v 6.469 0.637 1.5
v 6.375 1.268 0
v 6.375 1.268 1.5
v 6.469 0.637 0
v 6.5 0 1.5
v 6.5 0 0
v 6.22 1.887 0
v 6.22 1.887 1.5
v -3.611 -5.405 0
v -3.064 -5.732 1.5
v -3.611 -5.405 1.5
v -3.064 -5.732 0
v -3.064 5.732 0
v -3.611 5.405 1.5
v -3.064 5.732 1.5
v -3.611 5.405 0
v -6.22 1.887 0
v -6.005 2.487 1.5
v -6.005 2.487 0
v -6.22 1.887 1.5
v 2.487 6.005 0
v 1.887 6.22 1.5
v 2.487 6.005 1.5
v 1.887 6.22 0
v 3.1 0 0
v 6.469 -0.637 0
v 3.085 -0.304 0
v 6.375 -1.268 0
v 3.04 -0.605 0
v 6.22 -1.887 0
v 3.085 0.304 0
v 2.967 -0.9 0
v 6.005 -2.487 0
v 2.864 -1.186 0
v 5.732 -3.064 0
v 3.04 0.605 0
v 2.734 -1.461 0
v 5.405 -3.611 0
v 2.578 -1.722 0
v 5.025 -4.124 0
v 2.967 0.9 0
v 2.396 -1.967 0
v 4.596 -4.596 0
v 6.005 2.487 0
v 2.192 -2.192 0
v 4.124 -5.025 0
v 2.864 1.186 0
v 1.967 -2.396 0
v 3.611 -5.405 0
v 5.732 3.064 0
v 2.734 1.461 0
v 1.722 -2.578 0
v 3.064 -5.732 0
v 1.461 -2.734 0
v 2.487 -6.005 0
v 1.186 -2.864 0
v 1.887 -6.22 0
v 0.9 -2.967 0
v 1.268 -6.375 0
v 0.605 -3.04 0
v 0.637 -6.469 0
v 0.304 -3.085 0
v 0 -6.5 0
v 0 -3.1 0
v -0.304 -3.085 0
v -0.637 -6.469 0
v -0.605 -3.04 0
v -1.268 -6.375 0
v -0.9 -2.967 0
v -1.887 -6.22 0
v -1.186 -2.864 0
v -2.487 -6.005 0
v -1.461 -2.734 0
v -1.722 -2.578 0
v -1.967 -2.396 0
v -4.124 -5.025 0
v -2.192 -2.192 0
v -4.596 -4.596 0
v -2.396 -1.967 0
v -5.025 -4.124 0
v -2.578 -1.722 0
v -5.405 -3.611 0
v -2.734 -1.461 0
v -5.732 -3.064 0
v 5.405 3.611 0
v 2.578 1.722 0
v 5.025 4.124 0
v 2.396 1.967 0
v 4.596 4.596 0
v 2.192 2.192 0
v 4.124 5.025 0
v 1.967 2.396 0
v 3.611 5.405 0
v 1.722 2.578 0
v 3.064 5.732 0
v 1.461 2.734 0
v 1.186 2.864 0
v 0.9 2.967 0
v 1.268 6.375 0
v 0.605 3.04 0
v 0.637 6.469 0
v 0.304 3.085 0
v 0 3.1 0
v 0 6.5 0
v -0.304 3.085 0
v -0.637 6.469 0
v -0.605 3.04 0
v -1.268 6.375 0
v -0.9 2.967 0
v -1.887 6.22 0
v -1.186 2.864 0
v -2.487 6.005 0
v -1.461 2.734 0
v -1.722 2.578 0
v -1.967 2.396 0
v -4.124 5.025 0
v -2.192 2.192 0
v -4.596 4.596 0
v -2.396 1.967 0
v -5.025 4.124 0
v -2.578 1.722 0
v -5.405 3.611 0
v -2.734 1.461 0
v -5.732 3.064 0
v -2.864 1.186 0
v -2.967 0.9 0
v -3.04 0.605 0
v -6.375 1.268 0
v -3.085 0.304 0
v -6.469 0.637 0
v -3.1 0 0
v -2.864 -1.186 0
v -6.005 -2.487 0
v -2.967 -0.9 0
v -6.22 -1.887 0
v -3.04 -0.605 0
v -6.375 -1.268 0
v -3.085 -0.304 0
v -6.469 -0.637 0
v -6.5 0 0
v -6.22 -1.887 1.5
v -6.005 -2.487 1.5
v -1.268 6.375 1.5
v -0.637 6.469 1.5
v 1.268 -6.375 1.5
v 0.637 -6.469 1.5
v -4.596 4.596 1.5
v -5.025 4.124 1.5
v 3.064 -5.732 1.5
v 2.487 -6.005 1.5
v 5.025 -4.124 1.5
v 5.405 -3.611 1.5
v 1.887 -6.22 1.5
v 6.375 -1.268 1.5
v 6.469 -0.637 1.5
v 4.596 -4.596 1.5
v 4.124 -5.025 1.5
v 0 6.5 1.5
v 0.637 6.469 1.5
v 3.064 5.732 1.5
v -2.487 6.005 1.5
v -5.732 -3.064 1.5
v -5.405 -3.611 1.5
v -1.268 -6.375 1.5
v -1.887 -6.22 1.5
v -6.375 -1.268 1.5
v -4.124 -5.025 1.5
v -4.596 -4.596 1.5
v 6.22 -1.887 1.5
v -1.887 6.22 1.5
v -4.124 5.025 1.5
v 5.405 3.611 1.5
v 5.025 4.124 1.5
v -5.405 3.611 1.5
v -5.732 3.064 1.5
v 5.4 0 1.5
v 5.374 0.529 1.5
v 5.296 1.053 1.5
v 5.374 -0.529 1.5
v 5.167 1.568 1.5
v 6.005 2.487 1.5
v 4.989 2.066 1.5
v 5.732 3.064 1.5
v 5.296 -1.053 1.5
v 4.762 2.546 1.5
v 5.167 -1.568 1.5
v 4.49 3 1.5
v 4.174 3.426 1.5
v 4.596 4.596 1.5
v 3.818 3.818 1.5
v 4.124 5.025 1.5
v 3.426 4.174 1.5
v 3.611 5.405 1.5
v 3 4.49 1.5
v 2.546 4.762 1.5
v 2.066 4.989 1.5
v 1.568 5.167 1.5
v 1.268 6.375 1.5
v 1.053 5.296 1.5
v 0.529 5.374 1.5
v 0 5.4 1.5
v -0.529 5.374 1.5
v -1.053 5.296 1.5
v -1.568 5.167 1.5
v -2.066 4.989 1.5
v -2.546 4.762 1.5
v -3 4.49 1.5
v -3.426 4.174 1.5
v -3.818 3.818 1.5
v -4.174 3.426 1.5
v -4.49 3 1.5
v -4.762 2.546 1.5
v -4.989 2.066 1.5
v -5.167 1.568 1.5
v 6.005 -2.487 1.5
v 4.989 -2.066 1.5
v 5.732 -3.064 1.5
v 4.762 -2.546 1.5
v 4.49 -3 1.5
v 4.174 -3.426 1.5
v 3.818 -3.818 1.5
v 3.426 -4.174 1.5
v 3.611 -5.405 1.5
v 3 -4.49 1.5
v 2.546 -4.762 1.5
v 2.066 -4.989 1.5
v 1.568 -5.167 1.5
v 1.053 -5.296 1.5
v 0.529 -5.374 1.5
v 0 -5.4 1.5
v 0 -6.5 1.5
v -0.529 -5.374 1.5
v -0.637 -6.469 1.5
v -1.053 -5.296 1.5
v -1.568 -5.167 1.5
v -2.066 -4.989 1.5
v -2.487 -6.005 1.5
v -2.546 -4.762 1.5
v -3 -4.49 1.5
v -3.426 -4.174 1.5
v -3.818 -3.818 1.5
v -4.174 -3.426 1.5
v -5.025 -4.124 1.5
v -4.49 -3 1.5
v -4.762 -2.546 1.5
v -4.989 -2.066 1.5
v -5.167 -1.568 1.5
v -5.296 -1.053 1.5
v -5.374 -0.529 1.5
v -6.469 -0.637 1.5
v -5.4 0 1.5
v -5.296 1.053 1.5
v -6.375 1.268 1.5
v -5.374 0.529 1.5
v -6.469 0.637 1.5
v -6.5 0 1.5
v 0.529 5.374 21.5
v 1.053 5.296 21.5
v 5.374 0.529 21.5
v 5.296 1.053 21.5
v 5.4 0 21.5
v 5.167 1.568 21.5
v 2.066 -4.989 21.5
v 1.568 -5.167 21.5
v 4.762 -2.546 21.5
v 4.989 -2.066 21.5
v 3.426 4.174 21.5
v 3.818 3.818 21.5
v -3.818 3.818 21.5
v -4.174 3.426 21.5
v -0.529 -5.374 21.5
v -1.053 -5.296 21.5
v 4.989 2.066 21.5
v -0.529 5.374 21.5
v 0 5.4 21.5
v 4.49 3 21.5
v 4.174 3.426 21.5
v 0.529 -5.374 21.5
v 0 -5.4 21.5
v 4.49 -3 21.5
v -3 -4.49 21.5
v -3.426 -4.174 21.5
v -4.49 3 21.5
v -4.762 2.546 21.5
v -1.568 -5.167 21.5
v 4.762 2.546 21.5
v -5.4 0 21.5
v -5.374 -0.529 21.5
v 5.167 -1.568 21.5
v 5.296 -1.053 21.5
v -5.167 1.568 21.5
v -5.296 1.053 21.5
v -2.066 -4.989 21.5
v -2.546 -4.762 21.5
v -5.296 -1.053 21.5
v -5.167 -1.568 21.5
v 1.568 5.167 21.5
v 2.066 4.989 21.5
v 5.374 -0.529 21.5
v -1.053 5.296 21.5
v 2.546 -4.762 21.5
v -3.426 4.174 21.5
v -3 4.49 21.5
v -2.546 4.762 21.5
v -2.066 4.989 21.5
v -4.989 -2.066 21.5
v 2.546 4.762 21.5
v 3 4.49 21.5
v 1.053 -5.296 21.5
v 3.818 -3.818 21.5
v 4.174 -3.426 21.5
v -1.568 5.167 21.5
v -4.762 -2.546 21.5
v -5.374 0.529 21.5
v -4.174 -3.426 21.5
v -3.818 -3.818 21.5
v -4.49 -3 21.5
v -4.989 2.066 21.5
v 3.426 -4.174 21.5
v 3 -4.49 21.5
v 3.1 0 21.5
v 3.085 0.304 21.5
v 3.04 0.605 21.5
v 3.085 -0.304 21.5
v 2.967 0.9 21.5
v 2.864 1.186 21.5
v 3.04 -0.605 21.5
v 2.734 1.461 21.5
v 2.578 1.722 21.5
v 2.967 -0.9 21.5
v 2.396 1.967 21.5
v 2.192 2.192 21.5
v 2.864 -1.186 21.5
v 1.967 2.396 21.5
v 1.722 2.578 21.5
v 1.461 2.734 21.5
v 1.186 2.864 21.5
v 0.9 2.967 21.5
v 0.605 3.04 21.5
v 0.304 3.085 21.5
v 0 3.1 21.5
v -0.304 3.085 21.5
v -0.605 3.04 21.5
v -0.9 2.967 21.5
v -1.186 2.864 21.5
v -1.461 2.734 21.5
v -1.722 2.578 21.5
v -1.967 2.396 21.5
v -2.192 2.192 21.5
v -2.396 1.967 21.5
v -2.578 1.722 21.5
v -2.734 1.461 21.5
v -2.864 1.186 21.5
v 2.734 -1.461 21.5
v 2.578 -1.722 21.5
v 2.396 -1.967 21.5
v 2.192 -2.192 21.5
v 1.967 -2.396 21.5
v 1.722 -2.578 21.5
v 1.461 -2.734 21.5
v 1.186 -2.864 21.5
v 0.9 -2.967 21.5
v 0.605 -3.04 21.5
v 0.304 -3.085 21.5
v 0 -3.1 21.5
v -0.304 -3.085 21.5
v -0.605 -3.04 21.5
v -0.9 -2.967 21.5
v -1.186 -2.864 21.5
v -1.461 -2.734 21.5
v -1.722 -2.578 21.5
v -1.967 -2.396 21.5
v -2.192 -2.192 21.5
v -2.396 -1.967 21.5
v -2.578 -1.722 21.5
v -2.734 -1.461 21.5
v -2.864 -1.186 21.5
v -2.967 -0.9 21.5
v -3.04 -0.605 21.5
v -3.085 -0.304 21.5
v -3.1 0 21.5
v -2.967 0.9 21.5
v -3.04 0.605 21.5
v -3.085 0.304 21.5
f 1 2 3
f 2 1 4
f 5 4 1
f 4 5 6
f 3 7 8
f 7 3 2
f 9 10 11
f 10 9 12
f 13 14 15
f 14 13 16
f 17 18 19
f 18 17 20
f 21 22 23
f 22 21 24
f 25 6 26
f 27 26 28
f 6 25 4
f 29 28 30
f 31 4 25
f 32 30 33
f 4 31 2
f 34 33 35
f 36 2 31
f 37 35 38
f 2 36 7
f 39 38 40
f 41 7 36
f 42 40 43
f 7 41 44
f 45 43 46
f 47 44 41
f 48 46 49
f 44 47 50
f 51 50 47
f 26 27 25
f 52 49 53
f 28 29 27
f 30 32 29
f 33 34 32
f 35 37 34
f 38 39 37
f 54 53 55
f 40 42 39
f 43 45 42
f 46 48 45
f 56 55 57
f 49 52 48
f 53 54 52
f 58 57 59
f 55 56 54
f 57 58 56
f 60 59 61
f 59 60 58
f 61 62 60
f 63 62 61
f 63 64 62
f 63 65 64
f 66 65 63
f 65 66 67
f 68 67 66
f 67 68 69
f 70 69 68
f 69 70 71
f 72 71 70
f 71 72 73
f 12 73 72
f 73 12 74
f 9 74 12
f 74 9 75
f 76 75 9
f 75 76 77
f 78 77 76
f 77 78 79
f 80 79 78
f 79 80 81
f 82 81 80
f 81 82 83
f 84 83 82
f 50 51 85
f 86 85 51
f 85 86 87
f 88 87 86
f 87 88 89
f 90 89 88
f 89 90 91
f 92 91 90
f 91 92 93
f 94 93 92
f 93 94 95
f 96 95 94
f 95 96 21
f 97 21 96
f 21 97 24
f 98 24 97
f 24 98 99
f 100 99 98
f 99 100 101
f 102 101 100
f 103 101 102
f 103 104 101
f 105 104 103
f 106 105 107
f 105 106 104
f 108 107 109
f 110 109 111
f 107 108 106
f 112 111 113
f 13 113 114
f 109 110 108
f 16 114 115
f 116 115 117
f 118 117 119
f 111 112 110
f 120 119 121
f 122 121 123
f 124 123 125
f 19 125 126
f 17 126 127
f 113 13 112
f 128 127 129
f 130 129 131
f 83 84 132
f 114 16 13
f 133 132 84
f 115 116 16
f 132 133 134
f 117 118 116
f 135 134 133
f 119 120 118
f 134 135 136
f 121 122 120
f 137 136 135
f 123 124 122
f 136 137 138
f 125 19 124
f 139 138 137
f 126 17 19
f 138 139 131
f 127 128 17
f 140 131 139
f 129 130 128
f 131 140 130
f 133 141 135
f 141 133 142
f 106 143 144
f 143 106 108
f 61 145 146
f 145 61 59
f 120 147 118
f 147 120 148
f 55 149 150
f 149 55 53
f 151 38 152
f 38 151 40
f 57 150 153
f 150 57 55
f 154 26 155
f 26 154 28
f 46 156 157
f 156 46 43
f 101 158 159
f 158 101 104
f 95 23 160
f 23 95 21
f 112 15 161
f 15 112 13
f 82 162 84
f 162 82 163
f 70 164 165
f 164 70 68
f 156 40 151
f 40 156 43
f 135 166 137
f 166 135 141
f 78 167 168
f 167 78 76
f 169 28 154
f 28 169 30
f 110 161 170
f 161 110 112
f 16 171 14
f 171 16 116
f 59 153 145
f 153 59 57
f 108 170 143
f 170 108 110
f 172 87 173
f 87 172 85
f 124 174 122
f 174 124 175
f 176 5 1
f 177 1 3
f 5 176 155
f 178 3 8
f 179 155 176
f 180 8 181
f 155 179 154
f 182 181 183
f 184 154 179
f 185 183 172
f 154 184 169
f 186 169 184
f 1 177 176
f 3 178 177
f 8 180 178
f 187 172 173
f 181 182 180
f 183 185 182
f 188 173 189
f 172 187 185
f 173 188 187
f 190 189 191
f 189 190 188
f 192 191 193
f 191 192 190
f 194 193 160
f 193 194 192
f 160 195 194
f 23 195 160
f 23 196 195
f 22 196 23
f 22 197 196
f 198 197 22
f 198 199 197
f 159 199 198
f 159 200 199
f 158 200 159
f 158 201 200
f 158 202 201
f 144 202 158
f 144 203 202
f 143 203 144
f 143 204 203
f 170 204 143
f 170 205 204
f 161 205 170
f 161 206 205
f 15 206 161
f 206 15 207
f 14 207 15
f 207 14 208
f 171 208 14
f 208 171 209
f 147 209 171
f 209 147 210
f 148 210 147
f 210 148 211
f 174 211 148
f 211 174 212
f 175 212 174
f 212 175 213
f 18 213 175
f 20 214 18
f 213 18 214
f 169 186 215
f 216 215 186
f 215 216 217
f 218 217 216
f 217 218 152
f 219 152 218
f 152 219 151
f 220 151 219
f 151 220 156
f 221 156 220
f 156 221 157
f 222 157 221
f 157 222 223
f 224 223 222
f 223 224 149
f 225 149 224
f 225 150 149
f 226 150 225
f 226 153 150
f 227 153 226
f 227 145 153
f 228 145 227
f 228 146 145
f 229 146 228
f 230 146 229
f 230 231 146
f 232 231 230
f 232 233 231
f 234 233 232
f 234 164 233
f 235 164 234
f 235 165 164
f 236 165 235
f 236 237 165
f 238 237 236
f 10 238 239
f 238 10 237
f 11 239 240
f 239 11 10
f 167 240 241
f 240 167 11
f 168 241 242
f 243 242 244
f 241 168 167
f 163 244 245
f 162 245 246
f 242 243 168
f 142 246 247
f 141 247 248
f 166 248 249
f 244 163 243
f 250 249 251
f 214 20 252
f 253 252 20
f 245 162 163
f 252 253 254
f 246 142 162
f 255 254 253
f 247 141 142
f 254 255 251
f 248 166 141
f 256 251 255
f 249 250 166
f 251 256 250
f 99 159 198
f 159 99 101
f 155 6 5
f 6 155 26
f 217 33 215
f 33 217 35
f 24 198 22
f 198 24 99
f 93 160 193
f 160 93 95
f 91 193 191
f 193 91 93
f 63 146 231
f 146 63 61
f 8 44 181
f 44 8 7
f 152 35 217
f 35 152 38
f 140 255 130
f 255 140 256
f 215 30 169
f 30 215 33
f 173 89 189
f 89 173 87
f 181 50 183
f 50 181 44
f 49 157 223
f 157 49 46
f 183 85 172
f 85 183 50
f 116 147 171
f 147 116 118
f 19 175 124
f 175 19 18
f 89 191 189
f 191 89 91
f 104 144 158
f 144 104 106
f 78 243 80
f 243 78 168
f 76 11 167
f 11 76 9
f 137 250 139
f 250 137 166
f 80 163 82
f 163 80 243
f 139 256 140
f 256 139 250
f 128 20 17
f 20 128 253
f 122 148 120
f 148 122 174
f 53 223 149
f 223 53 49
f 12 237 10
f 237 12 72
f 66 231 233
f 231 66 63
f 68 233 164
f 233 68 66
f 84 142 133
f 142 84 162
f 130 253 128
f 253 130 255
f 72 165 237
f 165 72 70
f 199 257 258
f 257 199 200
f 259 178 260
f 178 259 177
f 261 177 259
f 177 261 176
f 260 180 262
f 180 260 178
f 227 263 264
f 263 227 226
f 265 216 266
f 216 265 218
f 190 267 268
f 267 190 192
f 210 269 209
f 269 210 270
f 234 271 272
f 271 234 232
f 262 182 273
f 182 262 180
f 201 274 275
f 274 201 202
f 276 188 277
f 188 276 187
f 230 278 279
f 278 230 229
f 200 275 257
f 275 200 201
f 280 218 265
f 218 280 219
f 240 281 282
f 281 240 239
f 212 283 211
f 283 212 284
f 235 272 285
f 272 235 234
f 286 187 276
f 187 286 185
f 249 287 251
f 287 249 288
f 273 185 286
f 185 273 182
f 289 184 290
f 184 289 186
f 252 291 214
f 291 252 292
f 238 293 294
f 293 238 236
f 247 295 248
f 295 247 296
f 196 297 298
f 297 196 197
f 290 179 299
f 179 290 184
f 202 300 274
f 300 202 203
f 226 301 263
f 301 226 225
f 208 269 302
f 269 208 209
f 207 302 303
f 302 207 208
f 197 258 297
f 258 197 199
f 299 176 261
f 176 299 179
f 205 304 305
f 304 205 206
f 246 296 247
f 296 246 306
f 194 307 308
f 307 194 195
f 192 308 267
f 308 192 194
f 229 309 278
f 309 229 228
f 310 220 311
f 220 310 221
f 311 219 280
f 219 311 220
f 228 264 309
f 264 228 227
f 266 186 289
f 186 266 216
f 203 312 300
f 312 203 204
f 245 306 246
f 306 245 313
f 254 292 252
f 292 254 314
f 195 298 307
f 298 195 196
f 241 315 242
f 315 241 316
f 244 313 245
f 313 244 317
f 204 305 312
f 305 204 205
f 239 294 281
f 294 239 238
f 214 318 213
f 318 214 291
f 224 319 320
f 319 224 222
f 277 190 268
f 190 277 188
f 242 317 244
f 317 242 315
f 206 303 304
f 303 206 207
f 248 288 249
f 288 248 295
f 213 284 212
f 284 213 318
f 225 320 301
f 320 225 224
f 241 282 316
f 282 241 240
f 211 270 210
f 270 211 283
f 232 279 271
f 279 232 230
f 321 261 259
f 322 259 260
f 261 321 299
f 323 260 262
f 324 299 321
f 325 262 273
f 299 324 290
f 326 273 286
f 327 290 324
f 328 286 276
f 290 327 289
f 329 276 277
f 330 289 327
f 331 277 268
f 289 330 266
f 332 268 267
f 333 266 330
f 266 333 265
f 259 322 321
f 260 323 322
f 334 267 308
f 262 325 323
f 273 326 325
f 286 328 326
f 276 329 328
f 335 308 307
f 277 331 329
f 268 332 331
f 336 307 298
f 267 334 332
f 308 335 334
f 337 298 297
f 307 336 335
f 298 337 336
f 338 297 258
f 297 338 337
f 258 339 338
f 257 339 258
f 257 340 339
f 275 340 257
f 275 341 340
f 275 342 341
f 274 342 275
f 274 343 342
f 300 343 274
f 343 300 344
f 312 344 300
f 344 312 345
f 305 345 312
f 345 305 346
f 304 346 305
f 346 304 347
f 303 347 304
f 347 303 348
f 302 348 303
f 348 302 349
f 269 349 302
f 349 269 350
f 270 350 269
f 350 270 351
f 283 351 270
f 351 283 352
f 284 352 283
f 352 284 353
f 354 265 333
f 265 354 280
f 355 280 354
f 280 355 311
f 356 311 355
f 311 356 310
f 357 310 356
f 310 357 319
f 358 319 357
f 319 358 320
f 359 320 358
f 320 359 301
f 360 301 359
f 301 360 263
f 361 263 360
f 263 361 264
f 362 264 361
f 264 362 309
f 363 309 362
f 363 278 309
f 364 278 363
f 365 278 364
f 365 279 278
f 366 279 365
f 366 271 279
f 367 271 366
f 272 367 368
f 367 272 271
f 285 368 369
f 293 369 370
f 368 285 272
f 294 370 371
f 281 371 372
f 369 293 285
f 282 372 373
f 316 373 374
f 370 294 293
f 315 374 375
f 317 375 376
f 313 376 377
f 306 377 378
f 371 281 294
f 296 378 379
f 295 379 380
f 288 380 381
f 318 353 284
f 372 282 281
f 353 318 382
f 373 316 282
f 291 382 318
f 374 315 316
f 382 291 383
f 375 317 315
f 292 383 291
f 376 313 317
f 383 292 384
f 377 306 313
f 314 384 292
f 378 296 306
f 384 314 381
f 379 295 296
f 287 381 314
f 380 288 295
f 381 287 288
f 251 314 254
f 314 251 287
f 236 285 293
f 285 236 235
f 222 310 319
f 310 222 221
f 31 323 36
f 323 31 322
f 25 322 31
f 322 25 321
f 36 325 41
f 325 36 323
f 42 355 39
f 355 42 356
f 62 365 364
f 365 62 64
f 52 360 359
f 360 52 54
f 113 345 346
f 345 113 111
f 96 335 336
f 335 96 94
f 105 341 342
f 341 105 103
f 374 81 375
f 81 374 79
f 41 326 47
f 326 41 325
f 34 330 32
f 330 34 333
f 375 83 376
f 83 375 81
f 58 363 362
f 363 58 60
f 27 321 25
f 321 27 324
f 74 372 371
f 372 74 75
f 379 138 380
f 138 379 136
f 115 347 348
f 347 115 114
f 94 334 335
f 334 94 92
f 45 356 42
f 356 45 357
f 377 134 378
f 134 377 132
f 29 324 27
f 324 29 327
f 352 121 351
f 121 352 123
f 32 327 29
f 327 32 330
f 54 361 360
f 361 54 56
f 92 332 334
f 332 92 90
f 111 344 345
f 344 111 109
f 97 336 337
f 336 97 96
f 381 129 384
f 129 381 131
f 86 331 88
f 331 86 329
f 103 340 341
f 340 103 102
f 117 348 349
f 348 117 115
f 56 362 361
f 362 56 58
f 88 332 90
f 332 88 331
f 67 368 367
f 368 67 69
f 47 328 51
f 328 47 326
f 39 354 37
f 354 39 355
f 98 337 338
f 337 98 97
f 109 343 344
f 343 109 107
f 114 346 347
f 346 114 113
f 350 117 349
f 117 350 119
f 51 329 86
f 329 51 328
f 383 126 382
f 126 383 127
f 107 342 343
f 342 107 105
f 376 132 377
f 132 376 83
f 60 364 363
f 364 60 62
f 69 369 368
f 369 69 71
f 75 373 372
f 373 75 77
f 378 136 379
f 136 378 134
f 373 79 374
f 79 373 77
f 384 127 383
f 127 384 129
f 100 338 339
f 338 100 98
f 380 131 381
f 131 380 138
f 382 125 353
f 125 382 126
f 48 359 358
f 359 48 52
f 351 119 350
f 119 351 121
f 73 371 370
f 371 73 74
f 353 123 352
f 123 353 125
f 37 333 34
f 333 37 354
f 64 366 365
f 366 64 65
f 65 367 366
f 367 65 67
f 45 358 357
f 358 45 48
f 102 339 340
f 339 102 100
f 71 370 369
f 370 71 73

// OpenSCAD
// Adapter sleeve: 0.2 mL PCR tube for 1.5 mL rack hole
// Print orientation: collar down on the bed, sleeve rising in +Z

$fn = 64;

// ---- Dimensions (mm) ----
collar_d      = 13;    // collar outer diameter
collar_h      = 1.5;   // collar thickness (z = 0 to 1.5)
sleeve_od     = 10.8;  // sleeve body outer diameter
sleeve_top_z  = 21.5;  // top of sleeve body
bore_d        = 6.2;   // through-bore diameter
eps           = 0.5;   // cutter overshoot past faces

// ---- Model ----
difference() {
    union() {
        // Collar
        cylinder(d = collar_d, h = collar_h);
        // Sleeve body (overlaps slightly into collar for a clean union)
        translate([0, 0, collar_h - 0.01])
            cylinder(d = sleeve_od, h = sleeve_top_z - collar_h + 0.01);
    }
    // Full-height straight bore, open at both ends
    translate([0, 0, -eps])
        cylinder(d = bore_d, h = sleeve_top_z + 2 * eps);
}
